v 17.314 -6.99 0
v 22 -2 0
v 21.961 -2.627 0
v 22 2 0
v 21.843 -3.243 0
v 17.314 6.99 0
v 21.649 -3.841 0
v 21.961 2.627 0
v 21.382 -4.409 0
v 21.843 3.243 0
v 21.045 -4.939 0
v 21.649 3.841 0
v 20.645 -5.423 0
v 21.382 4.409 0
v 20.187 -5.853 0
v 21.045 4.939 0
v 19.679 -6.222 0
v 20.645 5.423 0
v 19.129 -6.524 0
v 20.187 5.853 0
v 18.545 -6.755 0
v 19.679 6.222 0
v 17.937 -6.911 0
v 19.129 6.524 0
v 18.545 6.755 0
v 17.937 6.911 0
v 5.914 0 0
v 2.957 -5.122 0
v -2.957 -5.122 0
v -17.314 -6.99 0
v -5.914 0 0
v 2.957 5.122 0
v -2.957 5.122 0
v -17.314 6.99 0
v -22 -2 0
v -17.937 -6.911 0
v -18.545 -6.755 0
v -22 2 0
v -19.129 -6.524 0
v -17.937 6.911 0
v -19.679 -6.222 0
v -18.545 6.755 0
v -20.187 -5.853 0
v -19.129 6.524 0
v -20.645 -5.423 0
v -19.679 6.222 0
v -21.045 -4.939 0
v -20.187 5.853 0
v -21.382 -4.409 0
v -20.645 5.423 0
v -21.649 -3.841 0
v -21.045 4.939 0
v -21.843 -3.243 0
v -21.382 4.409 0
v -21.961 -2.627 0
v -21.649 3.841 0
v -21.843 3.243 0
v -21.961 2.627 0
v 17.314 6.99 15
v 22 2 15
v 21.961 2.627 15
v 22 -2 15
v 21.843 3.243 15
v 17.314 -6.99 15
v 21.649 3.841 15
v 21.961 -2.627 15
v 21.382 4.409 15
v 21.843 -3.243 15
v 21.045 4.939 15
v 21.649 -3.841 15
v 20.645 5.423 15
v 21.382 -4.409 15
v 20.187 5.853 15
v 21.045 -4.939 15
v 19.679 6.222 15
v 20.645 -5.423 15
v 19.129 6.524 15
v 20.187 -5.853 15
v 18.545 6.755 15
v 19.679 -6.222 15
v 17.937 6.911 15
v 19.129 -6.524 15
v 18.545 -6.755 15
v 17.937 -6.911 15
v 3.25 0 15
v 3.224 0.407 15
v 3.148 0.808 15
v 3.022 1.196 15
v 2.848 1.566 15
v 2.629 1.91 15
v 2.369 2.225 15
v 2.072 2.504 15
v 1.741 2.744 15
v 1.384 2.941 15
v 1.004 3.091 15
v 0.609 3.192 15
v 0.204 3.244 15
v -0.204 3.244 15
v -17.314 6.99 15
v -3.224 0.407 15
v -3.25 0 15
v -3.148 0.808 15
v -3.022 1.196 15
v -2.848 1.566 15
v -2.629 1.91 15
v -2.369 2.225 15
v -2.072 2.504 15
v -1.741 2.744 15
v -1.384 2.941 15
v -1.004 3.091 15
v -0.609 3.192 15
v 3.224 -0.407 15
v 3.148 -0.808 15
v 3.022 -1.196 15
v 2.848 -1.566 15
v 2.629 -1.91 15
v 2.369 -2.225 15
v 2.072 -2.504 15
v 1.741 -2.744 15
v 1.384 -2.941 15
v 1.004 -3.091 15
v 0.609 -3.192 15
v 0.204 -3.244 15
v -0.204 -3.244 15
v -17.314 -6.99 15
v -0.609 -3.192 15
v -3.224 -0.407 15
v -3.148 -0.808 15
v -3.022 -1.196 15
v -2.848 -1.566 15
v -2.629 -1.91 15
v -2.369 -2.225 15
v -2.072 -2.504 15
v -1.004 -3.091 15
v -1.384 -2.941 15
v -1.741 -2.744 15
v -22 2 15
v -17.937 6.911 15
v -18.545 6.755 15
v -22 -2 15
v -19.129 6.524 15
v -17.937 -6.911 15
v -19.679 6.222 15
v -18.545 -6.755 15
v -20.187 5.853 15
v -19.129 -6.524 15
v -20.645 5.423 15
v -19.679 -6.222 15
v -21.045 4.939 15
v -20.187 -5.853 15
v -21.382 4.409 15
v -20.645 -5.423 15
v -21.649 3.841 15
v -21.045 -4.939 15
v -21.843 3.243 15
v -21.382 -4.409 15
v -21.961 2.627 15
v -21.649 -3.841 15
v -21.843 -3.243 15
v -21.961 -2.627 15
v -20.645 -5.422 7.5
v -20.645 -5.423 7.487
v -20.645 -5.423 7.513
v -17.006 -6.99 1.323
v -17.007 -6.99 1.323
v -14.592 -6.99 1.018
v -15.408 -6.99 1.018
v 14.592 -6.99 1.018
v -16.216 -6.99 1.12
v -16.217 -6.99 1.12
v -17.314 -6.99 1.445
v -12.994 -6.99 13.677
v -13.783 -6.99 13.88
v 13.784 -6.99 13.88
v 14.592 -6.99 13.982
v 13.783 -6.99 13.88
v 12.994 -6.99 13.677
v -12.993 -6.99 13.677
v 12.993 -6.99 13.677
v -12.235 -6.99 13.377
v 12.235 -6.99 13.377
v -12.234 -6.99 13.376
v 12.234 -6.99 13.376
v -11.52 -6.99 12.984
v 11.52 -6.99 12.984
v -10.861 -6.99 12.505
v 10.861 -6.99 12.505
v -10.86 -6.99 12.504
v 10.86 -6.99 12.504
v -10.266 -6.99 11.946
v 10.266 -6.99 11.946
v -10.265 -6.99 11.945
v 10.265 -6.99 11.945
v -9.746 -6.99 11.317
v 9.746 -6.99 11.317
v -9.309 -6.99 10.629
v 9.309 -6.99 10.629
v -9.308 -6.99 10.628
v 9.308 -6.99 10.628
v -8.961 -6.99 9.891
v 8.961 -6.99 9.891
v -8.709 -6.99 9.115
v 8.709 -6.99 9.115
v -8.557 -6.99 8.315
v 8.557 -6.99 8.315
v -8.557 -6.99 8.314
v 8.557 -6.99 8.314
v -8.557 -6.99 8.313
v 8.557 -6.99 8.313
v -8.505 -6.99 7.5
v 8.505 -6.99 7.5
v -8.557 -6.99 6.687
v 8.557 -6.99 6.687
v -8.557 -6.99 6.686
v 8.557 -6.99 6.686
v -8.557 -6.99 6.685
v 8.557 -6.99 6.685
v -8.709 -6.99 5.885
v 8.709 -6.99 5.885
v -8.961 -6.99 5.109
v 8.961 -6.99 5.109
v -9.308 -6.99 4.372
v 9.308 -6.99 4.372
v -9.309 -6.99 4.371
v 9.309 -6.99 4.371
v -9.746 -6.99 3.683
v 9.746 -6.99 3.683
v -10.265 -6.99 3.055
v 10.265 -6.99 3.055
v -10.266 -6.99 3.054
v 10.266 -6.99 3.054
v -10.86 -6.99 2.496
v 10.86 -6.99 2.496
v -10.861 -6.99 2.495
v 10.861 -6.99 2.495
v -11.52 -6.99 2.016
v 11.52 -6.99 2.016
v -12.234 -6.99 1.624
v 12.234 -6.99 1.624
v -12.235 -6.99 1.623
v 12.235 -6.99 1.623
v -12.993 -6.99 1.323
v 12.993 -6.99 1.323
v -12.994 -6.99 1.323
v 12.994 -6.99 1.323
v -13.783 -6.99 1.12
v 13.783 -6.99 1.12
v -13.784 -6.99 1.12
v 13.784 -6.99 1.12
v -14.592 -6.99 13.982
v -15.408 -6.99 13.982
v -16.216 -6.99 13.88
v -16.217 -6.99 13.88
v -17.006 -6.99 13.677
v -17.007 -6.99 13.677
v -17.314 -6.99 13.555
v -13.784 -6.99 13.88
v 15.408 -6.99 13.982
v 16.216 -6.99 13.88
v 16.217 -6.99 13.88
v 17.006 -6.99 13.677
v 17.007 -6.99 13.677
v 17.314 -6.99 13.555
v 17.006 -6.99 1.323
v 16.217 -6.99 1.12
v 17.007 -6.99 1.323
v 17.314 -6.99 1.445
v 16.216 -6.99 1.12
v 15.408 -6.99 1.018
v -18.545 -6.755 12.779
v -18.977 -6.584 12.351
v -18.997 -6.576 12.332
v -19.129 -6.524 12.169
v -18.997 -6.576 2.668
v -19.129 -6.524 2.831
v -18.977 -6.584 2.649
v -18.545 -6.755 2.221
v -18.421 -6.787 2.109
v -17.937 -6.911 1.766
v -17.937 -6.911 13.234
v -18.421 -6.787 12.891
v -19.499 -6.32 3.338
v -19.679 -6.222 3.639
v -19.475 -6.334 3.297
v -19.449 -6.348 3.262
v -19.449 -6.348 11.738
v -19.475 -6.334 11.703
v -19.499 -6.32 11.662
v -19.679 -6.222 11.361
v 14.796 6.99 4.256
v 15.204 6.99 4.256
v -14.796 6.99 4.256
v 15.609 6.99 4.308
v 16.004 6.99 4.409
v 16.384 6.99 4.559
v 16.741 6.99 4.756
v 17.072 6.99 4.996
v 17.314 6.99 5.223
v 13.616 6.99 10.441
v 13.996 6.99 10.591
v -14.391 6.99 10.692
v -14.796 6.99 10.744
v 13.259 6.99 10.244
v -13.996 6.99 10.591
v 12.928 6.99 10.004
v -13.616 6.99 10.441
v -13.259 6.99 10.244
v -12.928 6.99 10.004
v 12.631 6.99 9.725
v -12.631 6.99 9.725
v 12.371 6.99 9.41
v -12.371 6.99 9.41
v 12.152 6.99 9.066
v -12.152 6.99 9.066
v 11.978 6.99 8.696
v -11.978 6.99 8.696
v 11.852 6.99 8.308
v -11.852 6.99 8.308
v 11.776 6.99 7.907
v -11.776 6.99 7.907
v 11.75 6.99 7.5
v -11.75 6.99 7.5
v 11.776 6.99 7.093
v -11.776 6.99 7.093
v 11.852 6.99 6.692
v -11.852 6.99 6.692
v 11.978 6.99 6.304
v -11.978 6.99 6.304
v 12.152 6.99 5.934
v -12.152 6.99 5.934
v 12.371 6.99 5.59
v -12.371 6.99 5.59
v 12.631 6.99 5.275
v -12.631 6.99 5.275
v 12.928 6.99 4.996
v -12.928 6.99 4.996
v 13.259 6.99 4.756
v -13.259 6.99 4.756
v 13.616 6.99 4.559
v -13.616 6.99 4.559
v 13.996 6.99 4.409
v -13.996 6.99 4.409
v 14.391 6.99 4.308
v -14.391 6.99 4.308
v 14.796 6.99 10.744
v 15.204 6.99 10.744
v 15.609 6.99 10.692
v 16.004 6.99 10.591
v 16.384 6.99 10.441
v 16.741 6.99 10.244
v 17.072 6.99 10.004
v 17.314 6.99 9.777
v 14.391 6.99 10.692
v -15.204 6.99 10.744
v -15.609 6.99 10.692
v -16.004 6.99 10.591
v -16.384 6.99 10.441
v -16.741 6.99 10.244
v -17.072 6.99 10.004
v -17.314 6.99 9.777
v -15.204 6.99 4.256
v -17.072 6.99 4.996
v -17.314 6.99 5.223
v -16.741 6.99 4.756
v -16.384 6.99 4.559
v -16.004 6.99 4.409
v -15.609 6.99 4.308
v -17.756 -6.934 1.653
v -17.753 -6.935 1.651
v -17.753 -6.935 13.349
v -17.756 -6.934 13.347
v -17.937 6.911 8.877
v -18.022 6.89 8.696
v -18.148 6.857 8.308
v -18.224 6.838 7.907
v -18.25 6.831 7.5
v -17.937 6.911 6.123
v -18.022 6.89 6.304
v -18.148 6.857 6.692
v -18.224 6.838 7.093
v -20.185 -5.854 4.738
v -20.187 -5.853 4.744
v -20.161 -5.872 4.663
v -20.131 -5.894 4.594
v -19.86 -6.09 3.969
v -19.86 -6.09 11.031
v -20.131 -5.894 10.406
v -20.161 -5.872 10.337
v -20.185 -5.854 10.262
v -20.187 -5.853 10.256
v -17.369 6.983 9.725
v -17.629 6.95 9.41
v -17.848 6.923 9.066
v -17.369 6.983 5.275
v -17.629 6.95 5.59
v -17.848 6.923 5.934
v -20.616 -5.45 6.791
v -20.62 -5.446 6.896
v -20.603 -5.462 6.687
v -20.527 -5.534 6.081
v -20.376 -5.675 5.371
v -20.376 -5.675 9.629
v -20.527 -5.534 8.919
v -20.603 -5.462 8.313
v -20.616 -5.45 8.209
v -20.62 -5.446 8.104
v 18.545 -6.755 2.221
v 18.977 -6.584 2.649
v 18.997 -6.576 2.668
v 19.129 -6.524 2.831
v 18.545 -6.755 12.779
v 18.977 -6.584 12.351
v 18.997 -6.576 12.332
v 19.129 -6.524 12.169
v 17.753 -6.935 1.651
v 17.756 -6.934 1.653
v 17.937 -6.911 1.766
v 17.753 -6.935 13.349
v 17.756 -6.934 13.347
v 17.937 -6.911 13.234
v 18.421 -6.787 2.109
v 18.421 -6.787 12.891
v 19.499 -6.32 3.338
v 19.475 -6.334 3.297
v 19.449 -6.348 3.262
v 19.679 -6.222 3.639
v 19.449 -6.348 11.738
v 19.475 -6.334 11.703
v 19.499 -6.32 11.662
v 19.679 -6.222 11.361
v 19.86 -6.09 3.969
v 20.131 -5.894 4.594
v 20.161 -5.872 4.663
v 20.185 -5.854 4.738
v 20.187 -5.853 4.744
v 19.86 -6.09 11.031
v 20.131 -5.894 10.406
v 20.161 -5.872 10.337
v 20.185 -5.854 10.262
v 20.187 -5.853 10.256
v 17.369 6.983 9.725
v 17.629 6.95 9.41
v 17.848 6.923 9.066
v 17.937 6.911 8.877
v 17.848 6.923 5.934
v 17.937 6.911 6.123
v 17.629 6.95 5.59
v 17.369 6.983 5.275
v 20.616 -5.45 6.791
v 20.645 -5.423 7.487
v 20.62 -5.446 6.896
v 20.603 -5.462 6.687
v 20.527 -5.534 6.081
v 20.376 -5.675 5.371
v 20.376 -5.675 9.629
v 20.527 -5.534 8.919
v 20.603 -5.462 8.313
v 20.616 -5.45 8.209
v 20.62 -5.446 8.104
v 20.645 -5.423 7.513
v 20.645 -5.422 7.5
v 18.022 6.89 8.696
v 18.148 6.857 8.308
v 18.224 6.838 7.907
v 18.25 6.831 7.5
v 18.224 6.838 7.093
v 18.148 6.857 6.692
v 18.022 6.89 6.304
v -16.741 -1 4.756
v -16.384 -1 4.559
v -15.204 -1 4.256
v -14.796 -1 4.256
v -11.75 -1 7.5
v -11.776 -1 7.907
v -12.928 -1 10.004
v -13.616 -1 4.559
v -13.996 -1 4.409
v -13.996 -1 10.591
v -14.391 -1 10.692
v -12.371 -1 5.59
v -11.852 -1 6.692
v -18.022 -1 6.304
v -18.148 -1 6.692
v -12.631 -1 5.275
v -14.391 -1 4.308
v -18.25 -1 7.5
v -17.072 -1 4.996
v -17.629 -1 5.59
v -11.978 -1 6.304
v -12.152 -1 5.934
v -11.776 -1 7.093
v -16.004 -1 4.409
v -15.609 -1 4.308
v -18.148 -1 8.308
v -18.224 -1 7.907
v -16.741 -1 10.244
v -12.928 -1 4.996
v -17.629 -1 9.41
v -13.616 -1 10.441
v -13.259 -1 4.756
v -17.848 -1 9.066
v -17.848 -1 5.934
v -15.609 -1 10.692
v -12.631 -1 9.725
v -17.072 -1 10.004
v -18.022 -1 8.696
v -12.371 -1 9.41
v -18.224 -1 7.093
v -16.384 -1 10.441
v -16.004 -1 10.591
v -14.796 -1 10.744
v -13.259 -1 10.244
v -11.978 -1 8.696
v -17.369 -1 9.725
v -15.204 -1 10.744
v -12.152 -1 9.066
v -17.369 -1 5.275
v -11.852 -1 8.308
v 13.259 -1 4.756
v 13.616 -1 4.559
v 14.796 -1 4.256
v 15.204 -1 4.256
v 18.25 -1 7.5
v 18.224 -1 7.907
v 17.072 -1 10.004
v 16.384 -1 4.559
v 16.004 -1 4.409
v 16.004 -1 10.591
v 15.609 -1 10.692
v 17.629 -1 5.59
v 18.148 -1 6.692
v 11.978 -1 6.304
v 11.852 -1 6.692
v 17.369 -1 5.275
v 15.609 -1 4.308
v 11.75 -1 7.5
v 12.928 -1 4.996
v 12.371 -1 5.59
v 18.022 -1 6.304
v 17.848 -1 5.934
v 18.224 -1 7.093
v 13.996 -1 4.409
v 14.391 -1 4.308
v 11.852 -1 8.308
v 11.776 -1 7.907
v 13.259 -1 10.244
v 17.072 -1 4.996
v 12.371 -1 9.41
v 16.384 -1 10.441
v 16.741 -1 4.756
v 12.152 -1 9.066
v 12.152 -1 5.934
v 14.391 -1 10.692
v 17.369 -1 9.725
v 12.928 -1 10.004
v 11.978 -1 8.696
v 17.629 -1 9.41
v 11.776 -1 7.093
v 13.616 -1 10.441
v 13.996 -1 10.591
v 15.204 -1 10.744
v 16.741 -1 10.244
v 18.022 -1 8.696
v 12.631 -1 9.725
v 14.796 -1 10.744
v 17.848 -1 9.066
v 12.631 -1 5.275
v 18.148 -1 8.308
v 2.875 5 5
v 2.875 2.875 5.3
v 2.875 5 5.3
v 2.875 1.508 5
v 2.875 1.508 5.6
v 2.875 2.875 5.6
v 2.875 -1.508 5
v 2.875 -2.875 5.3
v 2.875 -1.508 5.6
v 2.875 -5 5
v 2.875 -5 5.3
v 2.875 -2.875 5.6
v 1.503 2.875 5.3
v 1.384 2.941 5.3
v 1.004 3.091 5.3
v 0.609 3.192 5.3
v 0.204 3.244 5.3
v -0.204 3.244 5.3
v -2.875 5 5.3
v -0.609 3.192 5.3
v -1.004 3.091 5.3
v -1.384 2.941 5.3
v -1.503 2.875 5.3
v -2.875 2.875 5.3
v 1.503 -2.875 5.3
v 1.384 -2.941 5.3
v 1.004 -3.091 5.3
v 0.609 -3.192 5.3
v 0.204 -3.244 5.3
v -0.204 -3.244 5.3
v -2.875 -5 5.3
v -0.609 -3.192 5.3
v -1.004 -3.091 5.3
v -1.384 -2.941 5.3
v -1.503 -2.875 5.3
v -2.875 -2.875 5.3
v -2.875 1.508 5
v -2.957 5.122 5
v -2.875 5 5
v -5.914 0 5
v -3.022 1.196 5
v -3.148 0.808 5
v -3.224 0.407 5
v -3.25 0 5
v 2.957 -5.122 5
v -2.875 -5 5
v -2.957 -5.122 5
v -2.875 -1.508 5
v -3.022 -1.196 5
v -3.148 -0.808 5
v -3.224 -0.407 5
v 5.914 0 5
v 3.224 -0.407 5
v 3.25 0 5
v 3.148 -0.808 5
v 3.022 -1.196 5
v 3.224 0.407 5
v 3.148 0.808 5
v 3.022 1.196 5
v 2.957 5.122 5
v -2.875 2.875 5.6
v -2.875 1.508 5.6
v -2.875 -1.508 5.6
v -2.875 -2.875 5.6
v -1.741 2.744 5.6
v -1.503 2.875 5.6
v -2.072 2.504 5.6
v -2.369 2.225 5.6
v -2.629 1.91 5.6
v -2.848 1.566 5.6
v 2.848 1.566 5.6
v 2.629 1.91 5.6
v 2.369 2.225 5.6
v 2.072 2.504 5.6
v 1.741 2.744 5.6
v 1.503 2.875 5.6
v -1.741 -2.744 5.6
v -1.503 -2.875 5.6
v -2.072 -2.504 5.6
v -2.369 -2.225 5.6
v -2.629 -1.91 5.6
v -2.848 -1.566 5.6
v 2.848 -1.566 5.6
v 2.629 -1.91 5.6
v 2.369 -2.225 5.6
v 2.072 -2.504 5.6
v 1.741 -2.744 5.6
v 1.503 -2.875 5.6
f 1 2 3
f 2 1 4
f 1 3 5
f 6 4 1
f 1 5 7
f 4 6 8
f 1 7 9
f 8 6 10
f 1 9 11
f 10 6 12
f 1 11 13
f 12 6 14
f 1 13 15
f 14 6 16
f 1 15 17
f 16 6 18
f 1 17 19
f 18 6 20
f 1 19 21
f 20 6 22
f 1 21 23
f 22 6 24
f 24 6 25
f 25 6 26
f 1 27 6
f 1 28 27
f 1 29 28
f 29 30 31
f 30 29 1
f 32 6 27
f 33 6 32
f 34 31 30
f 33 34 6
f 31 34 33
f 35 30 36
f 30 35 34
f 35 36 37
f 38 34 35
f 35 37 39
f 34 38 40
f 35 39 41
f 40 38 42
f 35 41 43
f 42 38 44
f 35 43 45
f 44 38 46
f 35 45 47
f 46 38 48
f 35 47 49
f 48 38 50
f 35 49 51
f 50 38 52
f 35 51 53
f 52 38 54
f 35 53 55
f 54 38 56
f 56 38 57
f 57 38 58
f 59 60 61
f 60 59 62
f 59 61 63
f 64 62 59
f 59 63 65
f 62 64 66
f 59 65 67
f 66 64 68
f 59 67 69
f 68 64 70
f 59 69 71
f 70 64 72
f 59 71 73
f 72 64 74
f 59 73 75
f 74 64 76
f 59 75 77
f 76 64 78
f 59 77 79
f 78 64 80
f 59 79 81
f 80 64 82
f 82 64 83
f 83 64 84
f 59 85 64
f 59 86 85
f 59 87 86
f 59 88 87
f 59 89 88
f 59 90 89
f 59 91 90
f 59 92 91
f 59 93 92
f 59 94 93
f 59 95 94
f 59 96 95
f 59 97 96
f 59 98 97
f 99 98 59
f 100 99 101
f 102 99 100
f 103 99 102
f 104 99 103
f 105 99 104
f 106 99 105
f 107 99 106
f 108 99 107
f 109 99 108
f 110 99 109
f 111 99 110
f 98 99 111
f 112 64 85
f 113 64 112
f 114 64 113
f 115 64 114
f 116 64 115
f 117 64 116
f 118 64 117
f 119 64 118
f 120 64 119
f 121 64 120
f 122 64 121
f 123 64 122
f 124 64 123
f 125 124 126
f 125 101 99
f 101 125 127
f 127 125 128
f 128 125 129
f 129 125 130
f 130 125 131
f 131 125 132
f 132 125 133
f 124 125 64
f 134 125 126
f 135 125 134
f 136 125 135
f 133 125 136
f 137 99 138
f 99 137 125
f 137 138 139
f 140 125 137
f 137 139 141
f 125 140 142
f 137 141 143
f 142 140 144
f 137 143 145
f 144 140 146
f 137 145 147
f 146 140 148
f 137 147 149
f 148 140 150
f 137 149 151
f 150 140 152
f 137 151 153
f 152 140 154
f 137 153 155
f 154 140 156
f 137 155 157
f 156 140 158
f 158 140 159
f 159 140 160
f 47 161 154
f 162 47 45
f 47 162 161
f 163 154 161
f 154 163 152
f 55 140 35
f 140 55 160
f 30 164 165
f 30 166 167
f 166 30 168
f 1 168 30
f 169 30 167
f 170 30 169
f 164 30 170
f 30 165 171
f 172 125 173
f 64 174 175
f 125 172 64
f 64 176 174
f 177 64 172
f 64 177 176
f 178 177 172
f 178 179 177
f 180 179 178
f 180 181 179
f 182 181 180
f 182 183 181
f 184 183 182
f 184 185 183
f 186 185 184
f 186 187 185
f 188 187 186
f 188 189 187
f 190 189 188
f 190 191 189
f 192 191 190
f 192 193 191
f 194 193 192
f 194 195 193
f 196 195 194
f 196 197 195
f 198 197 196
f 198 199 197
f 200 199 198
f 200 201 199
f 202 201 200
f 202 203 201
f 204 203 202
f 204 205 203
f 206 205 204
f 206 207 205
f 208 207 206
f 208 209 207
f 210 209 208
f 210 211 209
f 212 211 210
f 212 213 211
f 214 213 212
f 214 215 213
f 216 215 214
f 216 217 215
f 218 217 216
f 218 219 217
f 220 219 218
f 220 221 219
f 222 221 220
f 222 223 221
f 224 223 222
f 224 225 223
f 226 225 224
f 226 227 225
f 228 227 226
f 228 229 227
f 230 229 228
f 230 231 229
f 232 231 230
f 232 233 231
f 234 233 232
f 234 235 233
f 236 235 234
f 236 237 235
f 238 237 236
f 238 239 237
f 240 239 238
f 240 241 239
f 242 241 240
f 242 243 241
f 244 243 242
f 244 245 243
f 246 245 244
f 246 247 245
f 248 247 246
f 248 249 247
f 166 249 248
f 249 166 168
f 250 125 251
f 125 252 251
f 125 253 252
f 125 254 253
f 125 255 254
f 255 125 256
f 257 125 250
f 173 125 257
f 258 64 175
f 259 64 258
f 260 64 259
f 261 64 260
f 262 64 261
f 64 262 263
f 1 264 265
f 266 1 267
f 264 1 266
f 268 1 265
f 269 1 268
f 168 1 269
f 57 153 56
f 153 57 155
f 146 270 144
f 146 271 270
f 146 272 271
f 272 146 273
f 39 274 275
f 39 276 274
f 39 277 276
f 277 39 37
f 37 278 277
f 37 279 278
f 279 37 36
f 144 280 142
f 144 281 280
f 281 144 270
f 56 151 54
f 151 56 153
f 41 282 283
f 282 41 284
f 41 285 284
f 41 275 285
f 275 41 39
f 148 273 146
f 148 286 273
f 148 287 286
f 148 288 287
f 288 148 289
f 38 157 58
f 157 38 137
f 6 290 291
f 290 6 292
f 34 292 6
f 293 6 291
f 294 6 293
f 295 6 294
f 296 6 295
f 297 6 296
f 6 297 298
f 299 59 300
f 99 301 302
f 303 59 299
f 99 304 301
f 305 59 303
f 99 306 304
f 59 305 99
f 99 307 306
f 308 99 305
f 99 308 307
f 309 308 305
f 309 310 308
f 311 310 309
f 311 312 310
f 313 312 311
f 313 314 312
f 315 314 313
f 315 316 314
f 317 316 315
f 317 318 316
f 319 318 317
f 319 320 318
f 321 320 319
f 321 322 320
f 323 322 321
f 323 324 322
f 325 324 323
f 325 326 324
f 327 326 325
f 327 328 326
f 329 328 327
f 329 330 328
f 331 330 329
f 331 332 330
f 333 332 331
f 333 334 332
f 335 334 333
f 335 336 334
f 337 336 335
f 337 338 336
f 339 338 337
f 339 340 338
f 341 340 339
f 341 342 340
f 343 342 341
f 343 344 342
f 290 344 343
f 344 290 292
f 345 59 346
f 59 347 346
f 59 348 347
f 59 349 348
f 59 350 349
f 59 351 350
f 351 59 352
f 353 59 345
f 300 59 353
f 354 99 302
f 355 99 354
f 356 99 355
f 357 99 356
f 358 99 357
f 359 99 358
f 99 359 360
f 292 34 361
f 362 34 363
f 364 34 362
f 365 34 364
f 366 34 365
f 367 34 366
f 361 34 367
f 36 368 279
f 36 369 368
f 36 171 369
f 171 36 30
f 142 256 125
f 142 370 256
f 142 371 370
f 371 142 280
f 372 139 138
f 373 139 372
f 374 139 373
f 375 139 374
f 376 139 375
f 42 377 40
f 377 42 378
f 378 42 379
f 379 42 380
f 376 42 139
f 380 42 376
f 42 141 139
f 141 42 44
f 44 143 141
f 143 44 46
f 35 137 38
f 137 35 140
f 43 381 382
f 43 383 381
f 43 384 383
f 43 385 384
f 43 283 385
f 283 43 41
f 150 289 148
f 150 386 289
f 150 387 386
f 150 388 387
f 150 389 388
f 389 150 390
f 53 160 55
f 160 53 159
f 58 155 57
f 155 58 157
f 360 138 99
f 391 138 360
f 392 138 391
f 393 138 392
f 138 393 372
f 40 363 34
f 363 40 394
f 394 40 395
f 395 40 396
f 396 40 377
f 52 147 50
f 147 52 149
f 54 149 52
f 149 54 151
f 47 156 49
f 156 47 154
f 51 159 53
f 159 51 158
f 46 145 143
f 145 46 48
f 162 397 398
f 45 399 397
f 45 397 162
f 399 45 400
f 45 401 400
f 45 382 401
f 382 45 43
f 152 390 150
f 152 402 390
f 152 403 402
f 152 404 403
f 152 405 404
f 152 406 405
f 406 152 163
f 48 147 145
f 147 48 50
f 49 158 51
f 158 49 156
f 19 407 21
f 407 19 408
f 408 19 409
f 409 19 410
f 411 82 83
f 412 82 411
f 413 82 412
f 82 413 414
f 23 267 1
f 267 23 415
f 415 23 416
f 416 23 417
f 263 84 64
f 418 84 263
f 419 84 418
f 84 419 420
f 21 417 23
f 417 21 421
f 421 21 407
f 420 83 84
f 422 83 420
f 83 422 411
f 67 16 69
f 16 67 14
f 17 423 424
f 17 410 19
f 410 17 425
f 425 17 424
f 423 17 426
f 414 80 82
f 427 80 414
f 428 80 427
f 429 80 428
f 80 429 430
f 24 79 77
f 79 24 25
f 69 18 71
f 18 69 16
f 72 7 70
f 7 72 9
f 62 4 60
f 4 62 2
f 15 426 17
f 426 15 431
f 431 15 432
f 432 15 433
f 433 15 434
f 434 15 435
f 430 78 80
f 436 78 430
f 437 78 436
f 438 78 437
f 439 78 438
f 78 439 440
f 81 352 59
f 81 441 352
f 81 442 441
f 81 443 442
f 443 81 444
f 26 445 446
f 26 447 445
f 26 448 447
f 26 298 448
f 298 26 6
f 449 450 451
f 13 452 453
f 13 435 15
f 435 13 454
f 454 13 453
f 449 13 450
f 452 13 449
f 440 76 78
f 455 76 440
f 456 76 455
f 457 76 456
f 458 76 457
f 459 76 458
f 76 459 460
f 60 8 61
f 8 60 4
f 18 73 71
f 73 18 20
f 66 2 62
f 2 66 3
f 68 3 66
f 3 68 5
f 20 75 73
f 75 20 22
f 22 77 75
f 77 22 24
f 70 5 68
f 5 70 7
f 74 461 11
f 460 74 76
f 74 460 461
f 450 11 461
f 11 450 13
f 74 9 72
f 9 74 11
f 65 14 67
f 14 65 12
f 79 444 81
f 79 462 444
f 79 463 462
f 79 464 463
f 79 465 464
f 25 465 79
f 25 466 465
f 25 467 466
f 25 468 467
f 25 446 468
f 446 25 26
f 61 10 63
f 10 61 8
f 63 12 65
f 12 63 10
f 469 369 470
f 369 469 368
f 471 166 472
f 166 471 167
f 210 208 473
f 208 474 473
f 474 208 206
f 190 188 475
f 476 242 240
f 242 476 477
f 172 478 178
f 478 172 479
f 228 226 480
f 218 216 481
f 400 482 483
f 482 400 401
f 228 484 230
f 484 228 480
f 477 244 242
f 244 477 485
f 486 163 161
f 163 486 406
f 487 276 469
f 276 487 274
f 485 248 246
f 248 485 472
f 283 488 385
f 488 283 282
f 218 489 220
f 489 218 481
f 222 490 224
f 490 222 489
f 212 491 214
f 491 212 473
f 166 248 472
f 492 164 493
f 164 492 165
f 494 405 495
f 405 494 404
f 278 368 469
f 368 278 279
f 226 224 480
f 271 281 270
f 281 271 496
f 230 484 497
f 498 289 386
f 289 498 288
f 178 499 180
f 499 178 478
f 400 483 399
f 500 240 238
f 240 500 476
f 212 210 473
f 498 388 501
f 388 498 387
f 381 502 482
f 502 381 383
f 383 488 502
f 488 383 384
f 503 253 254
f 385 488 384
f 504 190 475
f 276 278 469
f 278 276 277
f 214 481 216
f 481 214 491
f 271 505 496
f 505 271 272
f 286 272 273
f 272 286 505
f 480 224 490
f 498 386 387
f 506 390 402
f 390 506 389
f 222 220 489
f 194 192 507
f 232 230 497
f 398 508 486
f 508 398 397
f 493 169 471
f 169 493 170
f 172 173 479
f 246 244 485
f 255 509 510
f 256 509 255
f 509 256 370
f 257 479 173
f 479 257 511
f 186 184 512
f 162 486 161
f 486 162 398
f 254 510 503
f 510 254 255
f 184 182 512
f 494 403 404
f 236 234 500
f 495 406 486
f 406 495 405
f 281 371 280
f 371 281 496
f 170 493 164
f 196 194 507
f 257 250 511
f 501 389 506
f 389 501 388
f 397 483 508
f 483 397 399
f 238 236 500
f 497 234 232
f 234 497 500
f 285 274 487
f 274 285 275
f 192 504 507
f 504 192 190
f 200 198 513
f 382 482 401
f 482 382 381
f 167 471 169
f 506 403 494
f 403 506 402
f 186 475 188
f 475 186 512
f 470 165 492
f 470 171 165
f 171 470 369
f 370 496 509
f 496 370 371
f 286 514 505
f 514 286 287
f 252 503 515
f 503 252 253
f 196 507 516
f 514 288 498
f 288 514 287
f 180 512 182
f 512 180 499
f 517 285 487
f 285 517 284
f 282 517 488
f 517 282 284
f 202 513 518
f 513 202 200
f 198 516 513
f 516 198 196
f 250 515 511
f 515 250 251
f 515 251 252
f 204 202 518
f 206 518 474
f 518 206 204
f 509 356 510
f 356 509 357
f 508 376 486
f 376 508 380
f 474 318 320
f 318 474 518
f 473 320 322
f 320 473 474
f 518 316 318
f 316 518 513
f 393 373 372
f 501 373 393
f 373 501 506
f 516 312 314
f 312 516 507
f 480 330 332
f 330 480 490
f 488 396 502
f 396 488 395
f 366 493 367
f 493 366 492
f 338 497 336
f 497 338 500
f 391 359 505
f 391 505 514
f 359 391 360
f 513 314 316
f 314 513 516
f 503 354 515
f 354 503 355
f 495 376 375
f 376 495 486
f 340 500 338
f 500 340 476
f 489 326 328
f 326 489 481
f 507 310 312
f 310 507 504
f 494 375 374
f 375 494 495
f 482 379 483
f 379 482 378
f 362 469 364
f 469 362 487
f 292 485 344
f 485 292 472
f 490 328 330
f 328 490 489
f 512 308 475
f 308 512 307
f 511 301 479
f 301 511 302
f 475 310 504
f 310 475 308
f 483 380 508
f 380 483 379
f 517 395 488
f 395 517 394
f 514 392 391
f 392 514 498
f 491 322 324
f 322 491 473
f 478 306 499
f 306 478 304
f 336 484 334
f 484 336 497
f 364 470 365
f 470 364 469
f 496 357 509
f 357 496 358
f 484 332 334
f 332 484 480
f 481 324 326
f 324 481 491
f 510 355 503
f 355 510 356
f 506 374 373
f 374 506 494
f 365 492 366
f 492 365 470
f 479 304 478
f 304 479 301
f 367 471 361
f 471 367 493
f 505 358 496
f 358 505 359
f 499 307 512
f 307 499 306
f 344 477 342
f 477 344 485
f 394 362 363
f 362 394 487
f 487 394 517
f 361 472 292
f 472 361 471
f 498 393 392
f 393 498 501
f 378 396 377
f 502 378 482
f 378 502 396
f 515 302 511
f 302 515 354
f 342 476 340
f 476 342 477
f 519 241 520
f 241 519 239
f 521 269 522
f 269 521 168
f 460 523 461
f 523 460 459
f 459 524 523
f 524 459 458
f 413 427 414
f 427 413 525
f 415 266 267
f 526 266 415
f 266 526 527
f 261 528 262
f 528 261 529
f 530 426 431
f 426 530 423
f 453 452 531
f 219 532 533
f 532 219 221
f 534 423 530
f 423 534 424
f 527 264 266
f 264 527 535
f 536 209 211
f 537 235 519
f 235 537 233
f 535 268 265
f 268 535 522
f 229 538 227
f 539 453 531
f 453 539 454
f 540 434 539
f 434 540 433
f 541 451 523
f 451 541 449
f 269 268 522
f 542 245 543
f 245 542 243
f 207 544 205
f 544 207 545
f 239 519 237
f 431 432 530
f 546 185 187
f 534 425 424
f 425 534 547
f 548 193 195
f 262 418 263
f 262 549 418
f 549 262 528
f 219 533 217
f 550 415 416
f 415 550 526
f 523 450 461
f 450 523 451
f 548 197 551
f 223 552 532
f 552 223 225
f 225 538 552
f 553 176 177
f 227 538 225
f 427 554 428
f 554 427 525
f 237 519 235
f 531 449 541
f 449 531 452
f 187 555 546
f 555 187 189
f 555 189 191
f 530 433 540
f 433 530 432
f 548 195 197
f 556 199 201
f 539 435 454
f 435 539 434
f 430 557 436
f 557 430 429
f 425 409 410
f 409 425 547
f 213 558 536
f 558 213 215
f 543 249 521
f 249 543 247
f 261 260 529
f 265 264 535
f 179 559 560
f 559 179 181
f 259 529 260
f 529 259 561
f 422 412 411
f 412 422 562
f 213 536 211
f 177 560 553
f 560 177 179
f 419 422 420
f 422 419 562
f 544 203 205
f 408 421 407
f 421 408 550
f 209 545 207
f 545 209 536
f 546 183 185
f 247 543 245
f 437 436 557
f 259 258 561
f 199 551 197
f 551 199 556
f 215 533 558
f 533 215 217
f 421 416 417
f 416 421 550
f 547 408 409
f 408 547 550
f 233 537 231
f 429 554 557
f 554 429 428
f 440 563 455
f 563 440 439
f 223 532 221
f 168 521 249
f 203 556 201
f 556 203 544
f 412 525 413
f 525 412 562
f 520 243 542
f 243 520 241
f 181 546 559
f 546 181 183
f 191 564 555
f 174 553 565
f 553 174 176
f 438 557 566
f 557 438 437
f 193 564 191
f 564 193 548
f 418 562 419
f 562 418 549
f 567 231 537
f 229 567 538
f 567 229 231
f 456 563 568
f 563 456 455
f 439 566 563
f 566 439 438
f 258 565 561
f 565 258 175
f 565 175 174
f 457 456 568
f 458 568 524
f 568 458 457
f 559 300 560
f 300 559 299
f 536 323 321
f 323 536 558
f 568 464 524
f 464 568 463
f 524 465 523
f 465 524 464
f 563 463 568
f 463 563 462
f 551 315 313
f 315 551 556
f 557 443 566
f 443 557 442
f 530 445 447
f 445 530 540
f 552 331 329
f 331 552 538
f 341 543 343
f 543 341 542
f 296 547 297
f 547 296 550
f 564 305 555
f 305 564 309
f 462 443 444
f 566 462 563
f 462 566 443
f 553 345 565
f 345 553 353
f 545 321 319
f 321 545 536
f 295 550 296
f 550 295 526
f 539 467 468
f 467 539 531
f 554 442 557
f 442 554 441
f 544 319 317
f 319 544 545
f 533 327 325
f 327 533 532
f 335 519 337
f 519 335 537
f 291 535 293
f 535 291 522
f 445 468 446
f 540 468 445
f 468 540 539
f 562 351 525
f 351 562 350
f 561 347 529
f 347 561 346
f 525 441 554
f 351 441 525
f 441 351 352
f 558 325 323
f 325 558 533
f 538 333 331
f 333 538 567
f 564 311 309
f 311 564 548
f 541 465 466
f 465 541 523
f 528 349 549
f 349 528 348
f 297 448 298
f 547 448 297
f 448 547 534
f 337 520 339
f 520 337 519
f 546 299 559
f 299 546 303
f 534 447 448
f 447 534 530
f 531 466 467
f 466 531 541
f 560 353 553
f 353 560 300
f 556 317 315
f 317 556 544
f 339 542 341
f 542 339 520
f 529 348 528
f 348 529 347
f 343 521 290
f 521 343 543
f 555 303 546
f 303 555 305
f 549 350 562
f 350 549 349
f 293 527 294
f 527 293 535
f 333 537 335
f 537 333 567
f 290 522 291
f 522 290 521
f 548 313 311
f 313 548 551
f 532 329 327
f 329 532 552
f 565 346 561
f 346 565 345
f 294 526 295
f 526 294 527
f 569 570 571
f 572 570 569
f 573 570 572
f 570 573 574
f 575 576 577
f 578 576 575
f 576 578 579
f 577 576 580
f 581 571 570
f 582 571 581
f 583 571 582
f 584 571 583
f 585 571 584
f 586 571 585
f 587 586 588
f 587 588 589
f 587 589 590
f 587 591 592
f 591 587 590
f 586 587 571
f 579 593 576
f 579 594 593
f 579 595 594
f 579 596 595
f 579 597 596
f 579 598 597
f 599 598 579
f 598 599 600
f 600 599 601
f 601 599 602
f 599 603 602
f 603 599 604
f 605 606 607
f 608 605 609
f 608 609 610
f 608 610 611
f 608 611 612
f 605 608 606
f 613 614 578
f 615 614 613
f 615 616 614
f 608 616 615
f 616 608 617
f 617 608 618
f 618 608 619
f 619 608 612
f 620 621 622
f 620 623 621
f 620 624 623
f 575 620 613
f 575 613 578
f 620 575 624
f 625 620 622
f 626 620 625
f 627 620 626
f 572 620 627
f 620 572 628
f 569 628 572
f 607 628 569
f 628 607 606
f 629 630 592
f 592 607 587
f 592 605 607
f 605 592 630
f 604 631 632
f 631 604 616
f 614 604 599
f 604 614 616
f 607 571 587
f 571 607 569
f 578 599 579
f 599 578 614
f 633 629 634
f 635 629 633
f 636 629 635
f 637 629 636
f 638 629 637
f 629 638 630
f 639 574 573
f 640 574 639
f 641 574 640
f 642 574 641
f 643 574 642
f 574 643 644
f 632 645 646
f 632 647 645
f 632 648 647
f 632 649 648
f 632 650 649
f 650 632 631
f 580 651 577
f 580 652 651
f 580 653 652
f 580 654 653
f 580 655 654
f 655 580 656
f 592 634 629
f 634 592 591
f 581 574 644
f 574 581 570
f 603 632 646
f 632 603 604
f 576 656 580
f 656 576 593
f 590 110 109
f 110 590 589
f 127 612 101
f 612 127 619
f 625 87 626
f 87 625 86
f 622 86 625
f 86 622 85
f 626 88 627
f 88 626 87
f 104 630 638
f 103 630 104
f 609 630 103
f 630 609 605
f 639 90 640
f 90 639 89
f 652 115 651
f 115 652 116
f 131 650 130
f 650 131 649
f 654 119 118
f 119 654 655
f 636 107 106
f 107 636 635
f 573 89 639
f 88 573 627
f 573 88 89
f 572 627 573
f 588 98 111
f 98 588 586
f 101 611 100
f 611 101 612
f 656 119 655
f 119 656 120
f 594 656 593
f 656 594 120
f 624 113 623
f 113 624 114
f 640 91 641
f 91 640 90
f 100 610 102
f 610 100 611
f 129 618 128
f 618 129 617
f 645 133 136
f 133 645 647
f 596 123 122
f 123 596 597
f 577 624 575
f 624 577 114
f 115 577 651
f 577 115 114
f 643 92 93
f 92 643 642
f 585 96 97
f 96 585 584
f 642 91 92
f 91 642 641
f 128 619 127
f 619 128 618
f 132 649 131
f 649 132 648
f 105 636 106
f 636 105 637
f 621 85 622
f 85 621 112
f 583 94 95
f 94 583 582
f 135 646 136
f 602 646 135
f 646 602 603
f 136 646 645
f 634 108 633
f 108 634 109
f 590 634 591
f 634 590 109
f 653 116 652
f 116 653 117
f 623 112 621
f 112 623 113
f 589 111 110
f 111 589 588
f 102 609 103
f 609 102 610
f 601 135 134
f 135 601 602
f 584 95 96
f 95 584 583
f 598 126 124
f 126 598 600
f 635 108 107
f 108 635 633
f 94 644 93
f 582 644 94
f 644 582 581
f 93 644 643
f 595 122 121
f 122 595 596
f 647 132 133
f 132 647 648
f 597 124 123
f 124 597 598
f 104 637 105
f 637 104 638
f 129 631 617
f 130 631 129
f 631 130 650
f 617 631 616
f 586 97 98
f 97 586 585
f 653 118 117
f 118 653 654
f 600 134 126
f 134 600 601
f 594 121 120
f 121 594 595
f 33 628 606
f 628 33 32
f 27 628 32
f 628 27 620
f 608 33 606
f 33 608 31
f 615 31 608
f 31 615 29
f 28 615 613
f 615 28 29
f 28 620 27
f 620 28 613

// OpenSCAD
$fn = 50;


difference() {
	union() {
		cylinder(h = 15, r = 7.0000000000);
		translate(v = [-7.5000000000, 0.0000000000, 0]) {
			hull() {
				translate(v = [-9.5000000000, 2.0000000000, 0]) {
					cylinder(h = 15, r = 5);
				}
				translate(v = [9.5000000000, 2.0000000000, 0]) {
					cylinder(h = 15, r = 5);
				}
				translate(v = [-9.5000000000, -2.0000000000, 0]) {
					cylinder(h = 15, r = 5);
				}
				translate(v = [9.5000000000, -2.0000000000, 0]) {
					cylinder(h = 15, r = 5);
				}
			}
		}
		translate(v = [-7.5000000000, 0.0000000000, 0]) {
			hull() {
				translate(v = [-9.5000000000, 2.0000000000, 0]) {
					cylinder(h = 15, r = 5);
				}
				translate(v = [9.5000000000, 2.0000000000, 0]) {
					cylinder(h = 15, r = 5);
				}
				translate(v = [-9.5000000000, -2.0000000000, 0]) {
					cylinder(h = 15, r = 5);
				}
				translate(v = [9.5000000000, -2.0000000000, 0]) {
					cylinder(h = 15, r = 5);
				}
			}
		}
		translate(v = [7.5000000000, 0.0000000000, 0]) {
			hull() {
				translate(v = [-9.5000000000, 2.0000000000, 0]) {
					cylinder(h = 15, r = 5);
				}
				translate(v = [9.5000000000, 2.0000000000, 0]) {
					cylinder(h = 15, r = 5);
				}
				translate(v = [-9.5000000000, -2.0000000000, 0]) {
					cylinder(h = 15, r = 5);
				}
				translate(v = [9.5000000000, -2.0000000000, 0]) {
					cylinder(h = 15, r = 5);
				}
			}
		}
		translate(v = [7.5000000000, 0.0000000000, 0]) {
			hull() {
				translate(v = [-9.5000000000, 2.0000000000, 0]) {
					cylinder(h = 15, r = 5);
				}
				translate(v = [9.5000000000, 2.0000000000, 0]) {
					cylinder(h = 15, r = 5);
				}
				translate(v = [-9.5000000000, -2.0000000000, 0]) {
					cylinder(h = 15, r = 5);
				}
				translate(v = [9.5000000000, -2.0000000000, 0]) {
					cylinder(h = 15, r = 5);
				}
			}
		}
	}
	union() {
		translate(v = [-15.0000000000, -7.0000000000, 7.5000000000]) {
			rotate(a = [90, 0, 0]) {
				difference() {
					union() {
						#translate(v = [0, 0, -14.0000000000]) {
							cylinder(h = 14, r = 2.2500000000);
						}
						#translate(v = [0, 0, -6]) {
							cylinder(h = 6, r1 = 3.2500000000, r2 = 6.5000000000);
						}
						#translate(v = [0, 0, -14.0000000000]) {
							cylinder(h = 14, r = 3.2500000000);
						}
						#translate(v = [0, 0, -14.0000000000]) {
							cylinder(h = 14, r = 2.2500000000);
						}
					}
					union();
				}
			}
		}
		translate(v = [15.0000000000, -7.0000000000, 7.5000000000]) {
			rotate(a = [90, 0, 0]) {
				difference() {
					union() {
						#translate(v = [0, 0, -14.0000000000]) {
							cylinder(h = 14, r = 2.2500000000);
						}
						#translate(v = [0, 0, -6]) {
							cylinder(h = 6, r1 = 3.2500000000, r2 = 6.5000000000);
						}
						#translate(v = [0, 0, -14.0000000000]) {
							cylinder(h = 14, r = 3.2500000000);
						}
						#translate(v = [0, 0, -14.0000000000]) {
							cylinder(h = 14, r = 2.2500000000);
						}
					}
					union();
				}
			}
		}
		translate(v = [0.0000000000, 0.0000000000, 0]) {
			rotate(a = [0, 0, 0]) {
				difference() {
					union() {
						#translate(v = [-2.8750000000, -5.0000000000, -0.3000000000]) {
							cube(size = [5.7500000000, 10, 0.3000000000]);
						}
						#translate(v = [-2.8750000000, -2.8750000000, -0.6000000000]) {
							cube(size = [5.7500000000, 5.7500000000, 0.3000000000]);
						}
						#translate(v = [-2.8750000000, -5.0000000000, 5]) {
							cube(size = [5.7500000000, 10, 0.3000000000]);
						}
						#translate(v = [-2.8750000000, -2.8750000000, 5.3000000000]) {
							cube(size = [5.7500000000, 5.7500000000, 0.3000000000]);
						}
						#translate(v = [0, 0, -100.0000000000]) {
							cylinder(h = 200, r = 3.2500000000);
						}
						#linear_extrude(height = 5) {
							polygon(points = [[5.9142500000, 0.0000000000], [2.9571250000, 5.1218907443], [-2.9571250000, 5.1218907443], [-5.9142500000, 0.0000000000], [-2.9571250000, -5.1218907443], [2.9571250000, -5.1218907443]]);
						}
						#translate(v = [-2.8750000000, -5.0000000000, -0.3000000000]) {
							cube(size = [5.7500000000, 10, 0.3000000000]);
						}
						#translate(v = [-2.8750000000, -2.8750000000, -0.6000000000]) {
							cube(size = [5.7500000000, 5.7500000000, 0.3000000000]);
						}
						#translate(v = [-2.8750000000, -5.0000000000, 5]) {
							cube(size = [5.7500000000, 10, 0.3000000000]);
						}
						#translate(v = [-2.8750000000, -2.8750000000, 5.3000000000]) {
							cube(size = [5.7500000000, 5.7500000000, 0.3000000000]);
						}
						#translate(v = [0, 0, -100.0000000000]) {
							cylinder(h = 200, r = 3.2500000000);
						}
						#translate(v = [-2.8750000000, -5.0000000000, -0.3000000000]) {
							cube(size = [5.7500000000, 10, 0.3000000000]);
						}
						#translate(v = [-2.8750000000, -2.8750000000, -0.6000000000]) {
							cube(size = [5.7500000000, 5.7500000000, 0.3000000000]);
						}
						#translate(v = [-2.8750000000, -5.0000000000, 5]) {
							cube(size = [5.7500000000, 10, 0.3000000000]);
						}
						#translate(v = [-2.8750000000, -2.8750000000, 5.3000000000]) {
							cube(size = [5.7500000000, 5.7500000000, 0.3000000000]);
						}
						#translate(v = [0, 0, -100.0000000000]) {
							cylinder(h = 200, r = 3.2500000000);
						}
					}
					union();
				}
			}
		}
		translate(v = [0, 0, -100]) {
			cylinder(h = 200, r = 3.2500000000);
		}
		translate(v = [0, 0, -100]) {
			cylinder(h = 200, r = 1.8000000000);
		}
	}
}
